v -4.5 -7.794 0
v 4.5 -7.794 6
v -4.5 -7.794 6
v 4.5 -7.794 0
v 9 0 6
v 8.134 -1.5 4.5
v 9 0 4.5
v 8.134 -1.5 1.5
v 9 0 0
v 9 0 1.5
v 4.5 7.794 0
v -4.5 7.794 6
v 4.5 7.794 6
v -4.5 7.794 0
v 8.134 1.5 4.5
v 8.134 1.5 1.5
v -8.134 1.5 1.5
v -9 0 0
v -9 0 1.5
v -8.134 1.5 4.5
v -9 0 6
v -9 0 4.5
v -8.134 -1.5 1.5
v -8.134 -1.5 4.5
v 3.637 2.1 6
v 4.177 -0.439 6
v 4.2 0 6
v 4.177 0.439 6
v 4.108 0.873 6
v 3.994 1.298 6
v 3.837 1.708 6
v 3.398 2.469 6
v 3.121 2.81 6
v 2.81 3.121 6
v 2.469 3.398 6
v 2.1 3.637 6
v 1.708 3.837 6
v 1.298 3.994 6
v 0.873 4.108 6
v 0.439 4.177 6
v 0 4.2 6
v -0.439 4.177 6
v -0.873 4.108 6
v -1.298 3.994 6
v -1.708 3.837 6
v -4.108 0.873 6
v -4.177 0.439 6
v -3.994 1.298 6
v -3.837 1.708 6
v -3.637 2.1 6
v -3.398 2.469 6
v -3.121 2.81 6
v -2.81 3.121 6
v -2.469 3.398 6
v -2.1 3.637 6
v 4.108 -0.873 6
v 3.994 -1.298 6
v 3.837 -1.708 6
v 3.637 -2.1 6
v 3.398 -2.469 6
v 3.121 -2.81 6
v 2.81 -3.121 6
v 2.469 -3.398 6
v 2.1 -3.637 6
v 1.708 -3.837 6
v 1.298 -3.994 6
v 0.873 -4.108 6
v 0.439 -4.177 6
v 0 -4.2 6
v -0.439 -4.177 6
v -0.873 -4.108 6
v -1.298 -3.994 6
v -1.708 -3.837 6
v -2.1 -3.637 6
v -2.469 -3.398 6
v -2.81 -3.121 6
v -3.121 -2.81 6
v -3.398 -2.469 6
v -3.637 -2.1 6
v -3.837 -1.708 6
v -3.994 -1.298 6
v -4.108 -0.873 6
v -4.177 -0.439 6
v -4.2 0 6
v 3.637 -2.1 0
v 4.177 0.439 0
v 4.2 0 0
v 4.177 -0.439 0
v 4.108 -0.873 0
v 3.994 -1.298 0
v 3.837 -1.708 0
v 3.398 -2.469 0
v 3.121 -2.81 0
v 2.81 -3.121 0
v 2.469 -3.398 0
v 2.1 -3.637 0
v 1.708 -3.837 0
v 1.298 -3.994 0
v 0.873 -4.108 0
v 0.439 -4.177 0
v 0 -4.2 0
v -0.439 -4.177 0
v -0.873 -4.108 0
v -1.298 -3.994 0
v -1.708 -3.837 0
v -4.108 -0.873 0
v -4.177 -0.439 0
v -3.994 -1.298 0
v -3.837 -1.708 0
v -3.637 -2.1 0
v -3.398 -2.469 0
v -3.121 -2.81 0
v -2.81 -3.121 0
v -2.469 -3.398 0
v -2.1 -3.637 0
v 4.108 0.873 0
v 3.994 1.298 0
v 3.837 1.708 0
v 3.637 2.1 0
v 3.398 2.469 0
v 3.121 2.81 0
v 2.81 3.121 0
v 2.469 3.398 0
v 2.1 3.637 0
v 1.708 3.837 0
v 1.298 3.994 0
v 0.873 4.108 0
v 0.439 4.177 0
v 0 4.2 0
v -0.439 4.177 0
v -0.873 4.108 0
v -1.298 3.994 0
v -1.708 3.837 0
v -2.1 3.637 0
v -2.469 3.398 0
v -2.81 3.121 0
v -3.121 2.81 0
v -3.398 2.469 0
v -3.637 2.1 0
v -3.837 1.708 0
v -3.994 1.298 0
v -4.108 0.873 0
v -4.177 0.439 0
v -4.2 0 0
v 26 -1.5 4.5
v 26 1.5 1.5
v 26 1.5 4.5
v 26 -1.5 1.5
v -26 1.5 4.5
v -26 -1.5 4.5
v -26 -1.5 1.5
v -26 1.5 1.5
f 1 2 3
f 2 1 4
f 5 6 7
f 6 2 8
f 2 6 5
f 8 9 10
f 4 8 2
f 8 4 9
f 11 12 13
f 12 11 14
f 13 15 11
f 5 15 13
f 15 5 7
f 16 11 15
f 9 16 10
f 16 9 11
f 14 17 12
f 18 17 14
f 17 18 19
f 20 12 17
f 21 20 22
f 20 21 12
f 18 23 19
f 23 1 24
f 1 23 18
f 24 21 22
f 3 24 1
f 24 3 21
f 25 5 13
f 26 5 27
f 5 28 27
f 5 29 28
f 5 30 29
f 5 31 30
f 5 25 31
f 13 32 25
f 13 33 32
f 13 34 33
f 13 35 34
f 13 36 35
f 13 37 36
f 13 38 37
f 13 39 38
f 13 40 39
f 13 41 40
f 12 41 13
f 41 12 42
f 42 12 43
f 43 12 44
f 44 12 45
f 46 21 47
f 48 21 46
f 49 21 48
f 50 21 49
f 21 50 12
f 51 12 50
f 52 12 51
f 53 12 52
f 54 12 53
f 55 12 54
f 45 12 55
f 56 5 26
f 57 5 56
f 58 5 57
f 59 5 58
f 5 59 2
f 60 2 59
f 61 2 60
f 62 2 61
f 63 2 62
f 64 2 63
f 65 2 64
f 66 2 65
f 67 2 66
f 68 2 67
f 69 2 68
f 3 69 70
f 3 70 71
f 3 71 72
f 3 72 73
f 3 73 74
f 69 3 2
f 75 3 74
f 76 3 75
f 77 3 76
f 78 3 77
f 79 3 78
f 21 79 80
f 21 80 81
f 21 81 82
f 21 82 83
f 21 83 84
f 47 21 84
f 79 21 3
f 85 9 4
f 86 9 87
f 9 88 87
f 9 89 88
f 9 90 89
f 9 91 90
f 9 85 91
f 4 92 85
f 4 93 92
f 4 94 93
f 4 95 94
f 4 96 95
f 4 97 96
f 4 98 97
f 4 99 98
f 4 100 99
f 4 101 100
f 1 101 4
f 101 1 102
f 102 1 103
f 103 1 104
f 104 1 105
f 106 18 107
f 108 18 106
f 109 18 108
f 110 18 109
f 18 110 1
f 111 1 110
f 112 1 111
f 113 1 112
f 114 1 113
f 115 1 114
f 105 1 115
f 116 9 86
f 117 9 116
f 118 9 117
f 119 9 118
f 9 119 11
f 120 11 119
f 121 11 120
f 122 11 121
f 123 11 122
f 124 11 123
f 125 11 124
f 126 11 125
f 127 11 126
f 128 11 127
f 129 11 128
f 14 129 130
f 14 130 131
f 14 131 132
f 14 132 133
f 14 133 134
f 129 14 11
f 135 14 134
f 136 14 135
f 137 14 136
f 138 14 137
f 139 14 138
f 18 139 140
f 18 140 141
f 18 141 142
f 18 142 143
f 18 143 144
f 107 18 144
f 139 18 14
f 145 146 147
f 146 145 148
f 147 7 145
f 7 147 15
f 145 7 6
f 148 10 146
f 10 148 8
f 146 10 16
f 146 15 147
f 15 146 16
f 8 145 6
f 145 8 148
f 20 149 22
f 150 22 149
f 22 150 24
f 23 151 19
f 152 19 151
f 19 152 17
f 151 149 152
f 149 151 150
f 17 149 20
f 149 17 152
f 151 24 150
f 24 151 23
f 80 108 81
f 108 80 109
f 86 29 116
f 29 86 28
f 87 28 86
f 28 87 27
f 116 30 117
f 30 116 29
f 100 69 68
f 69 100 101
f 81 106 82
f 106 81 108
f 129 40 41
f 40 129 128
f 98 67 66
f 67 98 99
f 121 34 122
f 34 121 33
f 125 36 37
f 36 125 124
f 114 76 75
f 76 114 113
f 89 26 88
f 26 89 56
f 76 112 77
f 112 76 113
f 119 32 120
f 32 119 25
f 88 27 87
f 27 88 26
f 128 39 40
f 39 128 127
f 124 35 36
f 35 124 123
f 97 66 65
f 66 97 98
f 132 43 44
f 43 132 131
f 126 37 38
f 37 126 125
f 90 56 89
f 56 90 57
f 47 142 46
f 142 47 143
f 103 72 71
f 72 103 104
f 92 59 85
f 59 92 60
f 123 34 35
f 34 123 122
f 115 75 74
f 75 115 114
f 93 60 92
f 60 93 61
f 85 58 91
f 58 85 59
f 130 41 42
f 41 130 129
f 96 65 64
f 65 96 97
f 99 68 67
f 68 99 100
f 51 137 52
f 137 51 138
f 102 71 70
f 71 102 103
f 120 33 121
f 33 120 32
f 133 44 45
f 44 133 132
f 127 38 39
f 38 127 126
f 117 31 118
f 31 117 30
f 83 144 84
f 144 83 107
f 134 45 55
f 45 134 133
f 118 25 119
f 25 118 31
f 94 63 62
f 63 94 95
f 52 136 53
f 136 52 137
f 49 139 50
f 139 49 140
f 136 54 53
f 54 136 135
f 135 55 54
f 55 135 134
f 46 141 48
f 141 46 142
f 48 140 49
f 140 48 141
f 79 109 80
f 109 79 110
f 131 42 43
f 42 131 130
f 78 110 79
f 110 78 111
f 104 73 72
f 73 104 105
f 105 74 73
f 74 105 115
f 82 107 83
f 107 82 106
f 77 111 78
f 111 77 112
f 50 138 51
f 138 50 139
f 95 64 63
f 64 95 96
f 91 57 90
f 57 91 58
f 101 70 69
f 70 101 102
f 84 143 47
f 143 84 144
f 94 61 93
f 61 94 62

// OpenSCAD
// Wing nut with two reinforced wings.
$fn = 60;
eps = 0.02;
thread_d = 8.4;
body_d = 18;
body_h = 6;
wing_l = 18;
wing_t = 3;
difference() {
    union() {
        cylinder(d = body_d, h = body_h, $fn = 6);
        translate([body_d / 2 - 1, -wing_t / 2, body_h / 2 - wing_t / 2]) cube([wing_l, wing_t, wing_t]);
        translate([-body_d / 2 - wing_l + 1, -wing_t / 2, body_h / 2 - wing_t / 2]) cube([wing_l, wing_t, wing_t]);
    }
    translate([0, 0, -eps]) cylinder(d = thread_d, h = body_h + 2 * eps);
}
